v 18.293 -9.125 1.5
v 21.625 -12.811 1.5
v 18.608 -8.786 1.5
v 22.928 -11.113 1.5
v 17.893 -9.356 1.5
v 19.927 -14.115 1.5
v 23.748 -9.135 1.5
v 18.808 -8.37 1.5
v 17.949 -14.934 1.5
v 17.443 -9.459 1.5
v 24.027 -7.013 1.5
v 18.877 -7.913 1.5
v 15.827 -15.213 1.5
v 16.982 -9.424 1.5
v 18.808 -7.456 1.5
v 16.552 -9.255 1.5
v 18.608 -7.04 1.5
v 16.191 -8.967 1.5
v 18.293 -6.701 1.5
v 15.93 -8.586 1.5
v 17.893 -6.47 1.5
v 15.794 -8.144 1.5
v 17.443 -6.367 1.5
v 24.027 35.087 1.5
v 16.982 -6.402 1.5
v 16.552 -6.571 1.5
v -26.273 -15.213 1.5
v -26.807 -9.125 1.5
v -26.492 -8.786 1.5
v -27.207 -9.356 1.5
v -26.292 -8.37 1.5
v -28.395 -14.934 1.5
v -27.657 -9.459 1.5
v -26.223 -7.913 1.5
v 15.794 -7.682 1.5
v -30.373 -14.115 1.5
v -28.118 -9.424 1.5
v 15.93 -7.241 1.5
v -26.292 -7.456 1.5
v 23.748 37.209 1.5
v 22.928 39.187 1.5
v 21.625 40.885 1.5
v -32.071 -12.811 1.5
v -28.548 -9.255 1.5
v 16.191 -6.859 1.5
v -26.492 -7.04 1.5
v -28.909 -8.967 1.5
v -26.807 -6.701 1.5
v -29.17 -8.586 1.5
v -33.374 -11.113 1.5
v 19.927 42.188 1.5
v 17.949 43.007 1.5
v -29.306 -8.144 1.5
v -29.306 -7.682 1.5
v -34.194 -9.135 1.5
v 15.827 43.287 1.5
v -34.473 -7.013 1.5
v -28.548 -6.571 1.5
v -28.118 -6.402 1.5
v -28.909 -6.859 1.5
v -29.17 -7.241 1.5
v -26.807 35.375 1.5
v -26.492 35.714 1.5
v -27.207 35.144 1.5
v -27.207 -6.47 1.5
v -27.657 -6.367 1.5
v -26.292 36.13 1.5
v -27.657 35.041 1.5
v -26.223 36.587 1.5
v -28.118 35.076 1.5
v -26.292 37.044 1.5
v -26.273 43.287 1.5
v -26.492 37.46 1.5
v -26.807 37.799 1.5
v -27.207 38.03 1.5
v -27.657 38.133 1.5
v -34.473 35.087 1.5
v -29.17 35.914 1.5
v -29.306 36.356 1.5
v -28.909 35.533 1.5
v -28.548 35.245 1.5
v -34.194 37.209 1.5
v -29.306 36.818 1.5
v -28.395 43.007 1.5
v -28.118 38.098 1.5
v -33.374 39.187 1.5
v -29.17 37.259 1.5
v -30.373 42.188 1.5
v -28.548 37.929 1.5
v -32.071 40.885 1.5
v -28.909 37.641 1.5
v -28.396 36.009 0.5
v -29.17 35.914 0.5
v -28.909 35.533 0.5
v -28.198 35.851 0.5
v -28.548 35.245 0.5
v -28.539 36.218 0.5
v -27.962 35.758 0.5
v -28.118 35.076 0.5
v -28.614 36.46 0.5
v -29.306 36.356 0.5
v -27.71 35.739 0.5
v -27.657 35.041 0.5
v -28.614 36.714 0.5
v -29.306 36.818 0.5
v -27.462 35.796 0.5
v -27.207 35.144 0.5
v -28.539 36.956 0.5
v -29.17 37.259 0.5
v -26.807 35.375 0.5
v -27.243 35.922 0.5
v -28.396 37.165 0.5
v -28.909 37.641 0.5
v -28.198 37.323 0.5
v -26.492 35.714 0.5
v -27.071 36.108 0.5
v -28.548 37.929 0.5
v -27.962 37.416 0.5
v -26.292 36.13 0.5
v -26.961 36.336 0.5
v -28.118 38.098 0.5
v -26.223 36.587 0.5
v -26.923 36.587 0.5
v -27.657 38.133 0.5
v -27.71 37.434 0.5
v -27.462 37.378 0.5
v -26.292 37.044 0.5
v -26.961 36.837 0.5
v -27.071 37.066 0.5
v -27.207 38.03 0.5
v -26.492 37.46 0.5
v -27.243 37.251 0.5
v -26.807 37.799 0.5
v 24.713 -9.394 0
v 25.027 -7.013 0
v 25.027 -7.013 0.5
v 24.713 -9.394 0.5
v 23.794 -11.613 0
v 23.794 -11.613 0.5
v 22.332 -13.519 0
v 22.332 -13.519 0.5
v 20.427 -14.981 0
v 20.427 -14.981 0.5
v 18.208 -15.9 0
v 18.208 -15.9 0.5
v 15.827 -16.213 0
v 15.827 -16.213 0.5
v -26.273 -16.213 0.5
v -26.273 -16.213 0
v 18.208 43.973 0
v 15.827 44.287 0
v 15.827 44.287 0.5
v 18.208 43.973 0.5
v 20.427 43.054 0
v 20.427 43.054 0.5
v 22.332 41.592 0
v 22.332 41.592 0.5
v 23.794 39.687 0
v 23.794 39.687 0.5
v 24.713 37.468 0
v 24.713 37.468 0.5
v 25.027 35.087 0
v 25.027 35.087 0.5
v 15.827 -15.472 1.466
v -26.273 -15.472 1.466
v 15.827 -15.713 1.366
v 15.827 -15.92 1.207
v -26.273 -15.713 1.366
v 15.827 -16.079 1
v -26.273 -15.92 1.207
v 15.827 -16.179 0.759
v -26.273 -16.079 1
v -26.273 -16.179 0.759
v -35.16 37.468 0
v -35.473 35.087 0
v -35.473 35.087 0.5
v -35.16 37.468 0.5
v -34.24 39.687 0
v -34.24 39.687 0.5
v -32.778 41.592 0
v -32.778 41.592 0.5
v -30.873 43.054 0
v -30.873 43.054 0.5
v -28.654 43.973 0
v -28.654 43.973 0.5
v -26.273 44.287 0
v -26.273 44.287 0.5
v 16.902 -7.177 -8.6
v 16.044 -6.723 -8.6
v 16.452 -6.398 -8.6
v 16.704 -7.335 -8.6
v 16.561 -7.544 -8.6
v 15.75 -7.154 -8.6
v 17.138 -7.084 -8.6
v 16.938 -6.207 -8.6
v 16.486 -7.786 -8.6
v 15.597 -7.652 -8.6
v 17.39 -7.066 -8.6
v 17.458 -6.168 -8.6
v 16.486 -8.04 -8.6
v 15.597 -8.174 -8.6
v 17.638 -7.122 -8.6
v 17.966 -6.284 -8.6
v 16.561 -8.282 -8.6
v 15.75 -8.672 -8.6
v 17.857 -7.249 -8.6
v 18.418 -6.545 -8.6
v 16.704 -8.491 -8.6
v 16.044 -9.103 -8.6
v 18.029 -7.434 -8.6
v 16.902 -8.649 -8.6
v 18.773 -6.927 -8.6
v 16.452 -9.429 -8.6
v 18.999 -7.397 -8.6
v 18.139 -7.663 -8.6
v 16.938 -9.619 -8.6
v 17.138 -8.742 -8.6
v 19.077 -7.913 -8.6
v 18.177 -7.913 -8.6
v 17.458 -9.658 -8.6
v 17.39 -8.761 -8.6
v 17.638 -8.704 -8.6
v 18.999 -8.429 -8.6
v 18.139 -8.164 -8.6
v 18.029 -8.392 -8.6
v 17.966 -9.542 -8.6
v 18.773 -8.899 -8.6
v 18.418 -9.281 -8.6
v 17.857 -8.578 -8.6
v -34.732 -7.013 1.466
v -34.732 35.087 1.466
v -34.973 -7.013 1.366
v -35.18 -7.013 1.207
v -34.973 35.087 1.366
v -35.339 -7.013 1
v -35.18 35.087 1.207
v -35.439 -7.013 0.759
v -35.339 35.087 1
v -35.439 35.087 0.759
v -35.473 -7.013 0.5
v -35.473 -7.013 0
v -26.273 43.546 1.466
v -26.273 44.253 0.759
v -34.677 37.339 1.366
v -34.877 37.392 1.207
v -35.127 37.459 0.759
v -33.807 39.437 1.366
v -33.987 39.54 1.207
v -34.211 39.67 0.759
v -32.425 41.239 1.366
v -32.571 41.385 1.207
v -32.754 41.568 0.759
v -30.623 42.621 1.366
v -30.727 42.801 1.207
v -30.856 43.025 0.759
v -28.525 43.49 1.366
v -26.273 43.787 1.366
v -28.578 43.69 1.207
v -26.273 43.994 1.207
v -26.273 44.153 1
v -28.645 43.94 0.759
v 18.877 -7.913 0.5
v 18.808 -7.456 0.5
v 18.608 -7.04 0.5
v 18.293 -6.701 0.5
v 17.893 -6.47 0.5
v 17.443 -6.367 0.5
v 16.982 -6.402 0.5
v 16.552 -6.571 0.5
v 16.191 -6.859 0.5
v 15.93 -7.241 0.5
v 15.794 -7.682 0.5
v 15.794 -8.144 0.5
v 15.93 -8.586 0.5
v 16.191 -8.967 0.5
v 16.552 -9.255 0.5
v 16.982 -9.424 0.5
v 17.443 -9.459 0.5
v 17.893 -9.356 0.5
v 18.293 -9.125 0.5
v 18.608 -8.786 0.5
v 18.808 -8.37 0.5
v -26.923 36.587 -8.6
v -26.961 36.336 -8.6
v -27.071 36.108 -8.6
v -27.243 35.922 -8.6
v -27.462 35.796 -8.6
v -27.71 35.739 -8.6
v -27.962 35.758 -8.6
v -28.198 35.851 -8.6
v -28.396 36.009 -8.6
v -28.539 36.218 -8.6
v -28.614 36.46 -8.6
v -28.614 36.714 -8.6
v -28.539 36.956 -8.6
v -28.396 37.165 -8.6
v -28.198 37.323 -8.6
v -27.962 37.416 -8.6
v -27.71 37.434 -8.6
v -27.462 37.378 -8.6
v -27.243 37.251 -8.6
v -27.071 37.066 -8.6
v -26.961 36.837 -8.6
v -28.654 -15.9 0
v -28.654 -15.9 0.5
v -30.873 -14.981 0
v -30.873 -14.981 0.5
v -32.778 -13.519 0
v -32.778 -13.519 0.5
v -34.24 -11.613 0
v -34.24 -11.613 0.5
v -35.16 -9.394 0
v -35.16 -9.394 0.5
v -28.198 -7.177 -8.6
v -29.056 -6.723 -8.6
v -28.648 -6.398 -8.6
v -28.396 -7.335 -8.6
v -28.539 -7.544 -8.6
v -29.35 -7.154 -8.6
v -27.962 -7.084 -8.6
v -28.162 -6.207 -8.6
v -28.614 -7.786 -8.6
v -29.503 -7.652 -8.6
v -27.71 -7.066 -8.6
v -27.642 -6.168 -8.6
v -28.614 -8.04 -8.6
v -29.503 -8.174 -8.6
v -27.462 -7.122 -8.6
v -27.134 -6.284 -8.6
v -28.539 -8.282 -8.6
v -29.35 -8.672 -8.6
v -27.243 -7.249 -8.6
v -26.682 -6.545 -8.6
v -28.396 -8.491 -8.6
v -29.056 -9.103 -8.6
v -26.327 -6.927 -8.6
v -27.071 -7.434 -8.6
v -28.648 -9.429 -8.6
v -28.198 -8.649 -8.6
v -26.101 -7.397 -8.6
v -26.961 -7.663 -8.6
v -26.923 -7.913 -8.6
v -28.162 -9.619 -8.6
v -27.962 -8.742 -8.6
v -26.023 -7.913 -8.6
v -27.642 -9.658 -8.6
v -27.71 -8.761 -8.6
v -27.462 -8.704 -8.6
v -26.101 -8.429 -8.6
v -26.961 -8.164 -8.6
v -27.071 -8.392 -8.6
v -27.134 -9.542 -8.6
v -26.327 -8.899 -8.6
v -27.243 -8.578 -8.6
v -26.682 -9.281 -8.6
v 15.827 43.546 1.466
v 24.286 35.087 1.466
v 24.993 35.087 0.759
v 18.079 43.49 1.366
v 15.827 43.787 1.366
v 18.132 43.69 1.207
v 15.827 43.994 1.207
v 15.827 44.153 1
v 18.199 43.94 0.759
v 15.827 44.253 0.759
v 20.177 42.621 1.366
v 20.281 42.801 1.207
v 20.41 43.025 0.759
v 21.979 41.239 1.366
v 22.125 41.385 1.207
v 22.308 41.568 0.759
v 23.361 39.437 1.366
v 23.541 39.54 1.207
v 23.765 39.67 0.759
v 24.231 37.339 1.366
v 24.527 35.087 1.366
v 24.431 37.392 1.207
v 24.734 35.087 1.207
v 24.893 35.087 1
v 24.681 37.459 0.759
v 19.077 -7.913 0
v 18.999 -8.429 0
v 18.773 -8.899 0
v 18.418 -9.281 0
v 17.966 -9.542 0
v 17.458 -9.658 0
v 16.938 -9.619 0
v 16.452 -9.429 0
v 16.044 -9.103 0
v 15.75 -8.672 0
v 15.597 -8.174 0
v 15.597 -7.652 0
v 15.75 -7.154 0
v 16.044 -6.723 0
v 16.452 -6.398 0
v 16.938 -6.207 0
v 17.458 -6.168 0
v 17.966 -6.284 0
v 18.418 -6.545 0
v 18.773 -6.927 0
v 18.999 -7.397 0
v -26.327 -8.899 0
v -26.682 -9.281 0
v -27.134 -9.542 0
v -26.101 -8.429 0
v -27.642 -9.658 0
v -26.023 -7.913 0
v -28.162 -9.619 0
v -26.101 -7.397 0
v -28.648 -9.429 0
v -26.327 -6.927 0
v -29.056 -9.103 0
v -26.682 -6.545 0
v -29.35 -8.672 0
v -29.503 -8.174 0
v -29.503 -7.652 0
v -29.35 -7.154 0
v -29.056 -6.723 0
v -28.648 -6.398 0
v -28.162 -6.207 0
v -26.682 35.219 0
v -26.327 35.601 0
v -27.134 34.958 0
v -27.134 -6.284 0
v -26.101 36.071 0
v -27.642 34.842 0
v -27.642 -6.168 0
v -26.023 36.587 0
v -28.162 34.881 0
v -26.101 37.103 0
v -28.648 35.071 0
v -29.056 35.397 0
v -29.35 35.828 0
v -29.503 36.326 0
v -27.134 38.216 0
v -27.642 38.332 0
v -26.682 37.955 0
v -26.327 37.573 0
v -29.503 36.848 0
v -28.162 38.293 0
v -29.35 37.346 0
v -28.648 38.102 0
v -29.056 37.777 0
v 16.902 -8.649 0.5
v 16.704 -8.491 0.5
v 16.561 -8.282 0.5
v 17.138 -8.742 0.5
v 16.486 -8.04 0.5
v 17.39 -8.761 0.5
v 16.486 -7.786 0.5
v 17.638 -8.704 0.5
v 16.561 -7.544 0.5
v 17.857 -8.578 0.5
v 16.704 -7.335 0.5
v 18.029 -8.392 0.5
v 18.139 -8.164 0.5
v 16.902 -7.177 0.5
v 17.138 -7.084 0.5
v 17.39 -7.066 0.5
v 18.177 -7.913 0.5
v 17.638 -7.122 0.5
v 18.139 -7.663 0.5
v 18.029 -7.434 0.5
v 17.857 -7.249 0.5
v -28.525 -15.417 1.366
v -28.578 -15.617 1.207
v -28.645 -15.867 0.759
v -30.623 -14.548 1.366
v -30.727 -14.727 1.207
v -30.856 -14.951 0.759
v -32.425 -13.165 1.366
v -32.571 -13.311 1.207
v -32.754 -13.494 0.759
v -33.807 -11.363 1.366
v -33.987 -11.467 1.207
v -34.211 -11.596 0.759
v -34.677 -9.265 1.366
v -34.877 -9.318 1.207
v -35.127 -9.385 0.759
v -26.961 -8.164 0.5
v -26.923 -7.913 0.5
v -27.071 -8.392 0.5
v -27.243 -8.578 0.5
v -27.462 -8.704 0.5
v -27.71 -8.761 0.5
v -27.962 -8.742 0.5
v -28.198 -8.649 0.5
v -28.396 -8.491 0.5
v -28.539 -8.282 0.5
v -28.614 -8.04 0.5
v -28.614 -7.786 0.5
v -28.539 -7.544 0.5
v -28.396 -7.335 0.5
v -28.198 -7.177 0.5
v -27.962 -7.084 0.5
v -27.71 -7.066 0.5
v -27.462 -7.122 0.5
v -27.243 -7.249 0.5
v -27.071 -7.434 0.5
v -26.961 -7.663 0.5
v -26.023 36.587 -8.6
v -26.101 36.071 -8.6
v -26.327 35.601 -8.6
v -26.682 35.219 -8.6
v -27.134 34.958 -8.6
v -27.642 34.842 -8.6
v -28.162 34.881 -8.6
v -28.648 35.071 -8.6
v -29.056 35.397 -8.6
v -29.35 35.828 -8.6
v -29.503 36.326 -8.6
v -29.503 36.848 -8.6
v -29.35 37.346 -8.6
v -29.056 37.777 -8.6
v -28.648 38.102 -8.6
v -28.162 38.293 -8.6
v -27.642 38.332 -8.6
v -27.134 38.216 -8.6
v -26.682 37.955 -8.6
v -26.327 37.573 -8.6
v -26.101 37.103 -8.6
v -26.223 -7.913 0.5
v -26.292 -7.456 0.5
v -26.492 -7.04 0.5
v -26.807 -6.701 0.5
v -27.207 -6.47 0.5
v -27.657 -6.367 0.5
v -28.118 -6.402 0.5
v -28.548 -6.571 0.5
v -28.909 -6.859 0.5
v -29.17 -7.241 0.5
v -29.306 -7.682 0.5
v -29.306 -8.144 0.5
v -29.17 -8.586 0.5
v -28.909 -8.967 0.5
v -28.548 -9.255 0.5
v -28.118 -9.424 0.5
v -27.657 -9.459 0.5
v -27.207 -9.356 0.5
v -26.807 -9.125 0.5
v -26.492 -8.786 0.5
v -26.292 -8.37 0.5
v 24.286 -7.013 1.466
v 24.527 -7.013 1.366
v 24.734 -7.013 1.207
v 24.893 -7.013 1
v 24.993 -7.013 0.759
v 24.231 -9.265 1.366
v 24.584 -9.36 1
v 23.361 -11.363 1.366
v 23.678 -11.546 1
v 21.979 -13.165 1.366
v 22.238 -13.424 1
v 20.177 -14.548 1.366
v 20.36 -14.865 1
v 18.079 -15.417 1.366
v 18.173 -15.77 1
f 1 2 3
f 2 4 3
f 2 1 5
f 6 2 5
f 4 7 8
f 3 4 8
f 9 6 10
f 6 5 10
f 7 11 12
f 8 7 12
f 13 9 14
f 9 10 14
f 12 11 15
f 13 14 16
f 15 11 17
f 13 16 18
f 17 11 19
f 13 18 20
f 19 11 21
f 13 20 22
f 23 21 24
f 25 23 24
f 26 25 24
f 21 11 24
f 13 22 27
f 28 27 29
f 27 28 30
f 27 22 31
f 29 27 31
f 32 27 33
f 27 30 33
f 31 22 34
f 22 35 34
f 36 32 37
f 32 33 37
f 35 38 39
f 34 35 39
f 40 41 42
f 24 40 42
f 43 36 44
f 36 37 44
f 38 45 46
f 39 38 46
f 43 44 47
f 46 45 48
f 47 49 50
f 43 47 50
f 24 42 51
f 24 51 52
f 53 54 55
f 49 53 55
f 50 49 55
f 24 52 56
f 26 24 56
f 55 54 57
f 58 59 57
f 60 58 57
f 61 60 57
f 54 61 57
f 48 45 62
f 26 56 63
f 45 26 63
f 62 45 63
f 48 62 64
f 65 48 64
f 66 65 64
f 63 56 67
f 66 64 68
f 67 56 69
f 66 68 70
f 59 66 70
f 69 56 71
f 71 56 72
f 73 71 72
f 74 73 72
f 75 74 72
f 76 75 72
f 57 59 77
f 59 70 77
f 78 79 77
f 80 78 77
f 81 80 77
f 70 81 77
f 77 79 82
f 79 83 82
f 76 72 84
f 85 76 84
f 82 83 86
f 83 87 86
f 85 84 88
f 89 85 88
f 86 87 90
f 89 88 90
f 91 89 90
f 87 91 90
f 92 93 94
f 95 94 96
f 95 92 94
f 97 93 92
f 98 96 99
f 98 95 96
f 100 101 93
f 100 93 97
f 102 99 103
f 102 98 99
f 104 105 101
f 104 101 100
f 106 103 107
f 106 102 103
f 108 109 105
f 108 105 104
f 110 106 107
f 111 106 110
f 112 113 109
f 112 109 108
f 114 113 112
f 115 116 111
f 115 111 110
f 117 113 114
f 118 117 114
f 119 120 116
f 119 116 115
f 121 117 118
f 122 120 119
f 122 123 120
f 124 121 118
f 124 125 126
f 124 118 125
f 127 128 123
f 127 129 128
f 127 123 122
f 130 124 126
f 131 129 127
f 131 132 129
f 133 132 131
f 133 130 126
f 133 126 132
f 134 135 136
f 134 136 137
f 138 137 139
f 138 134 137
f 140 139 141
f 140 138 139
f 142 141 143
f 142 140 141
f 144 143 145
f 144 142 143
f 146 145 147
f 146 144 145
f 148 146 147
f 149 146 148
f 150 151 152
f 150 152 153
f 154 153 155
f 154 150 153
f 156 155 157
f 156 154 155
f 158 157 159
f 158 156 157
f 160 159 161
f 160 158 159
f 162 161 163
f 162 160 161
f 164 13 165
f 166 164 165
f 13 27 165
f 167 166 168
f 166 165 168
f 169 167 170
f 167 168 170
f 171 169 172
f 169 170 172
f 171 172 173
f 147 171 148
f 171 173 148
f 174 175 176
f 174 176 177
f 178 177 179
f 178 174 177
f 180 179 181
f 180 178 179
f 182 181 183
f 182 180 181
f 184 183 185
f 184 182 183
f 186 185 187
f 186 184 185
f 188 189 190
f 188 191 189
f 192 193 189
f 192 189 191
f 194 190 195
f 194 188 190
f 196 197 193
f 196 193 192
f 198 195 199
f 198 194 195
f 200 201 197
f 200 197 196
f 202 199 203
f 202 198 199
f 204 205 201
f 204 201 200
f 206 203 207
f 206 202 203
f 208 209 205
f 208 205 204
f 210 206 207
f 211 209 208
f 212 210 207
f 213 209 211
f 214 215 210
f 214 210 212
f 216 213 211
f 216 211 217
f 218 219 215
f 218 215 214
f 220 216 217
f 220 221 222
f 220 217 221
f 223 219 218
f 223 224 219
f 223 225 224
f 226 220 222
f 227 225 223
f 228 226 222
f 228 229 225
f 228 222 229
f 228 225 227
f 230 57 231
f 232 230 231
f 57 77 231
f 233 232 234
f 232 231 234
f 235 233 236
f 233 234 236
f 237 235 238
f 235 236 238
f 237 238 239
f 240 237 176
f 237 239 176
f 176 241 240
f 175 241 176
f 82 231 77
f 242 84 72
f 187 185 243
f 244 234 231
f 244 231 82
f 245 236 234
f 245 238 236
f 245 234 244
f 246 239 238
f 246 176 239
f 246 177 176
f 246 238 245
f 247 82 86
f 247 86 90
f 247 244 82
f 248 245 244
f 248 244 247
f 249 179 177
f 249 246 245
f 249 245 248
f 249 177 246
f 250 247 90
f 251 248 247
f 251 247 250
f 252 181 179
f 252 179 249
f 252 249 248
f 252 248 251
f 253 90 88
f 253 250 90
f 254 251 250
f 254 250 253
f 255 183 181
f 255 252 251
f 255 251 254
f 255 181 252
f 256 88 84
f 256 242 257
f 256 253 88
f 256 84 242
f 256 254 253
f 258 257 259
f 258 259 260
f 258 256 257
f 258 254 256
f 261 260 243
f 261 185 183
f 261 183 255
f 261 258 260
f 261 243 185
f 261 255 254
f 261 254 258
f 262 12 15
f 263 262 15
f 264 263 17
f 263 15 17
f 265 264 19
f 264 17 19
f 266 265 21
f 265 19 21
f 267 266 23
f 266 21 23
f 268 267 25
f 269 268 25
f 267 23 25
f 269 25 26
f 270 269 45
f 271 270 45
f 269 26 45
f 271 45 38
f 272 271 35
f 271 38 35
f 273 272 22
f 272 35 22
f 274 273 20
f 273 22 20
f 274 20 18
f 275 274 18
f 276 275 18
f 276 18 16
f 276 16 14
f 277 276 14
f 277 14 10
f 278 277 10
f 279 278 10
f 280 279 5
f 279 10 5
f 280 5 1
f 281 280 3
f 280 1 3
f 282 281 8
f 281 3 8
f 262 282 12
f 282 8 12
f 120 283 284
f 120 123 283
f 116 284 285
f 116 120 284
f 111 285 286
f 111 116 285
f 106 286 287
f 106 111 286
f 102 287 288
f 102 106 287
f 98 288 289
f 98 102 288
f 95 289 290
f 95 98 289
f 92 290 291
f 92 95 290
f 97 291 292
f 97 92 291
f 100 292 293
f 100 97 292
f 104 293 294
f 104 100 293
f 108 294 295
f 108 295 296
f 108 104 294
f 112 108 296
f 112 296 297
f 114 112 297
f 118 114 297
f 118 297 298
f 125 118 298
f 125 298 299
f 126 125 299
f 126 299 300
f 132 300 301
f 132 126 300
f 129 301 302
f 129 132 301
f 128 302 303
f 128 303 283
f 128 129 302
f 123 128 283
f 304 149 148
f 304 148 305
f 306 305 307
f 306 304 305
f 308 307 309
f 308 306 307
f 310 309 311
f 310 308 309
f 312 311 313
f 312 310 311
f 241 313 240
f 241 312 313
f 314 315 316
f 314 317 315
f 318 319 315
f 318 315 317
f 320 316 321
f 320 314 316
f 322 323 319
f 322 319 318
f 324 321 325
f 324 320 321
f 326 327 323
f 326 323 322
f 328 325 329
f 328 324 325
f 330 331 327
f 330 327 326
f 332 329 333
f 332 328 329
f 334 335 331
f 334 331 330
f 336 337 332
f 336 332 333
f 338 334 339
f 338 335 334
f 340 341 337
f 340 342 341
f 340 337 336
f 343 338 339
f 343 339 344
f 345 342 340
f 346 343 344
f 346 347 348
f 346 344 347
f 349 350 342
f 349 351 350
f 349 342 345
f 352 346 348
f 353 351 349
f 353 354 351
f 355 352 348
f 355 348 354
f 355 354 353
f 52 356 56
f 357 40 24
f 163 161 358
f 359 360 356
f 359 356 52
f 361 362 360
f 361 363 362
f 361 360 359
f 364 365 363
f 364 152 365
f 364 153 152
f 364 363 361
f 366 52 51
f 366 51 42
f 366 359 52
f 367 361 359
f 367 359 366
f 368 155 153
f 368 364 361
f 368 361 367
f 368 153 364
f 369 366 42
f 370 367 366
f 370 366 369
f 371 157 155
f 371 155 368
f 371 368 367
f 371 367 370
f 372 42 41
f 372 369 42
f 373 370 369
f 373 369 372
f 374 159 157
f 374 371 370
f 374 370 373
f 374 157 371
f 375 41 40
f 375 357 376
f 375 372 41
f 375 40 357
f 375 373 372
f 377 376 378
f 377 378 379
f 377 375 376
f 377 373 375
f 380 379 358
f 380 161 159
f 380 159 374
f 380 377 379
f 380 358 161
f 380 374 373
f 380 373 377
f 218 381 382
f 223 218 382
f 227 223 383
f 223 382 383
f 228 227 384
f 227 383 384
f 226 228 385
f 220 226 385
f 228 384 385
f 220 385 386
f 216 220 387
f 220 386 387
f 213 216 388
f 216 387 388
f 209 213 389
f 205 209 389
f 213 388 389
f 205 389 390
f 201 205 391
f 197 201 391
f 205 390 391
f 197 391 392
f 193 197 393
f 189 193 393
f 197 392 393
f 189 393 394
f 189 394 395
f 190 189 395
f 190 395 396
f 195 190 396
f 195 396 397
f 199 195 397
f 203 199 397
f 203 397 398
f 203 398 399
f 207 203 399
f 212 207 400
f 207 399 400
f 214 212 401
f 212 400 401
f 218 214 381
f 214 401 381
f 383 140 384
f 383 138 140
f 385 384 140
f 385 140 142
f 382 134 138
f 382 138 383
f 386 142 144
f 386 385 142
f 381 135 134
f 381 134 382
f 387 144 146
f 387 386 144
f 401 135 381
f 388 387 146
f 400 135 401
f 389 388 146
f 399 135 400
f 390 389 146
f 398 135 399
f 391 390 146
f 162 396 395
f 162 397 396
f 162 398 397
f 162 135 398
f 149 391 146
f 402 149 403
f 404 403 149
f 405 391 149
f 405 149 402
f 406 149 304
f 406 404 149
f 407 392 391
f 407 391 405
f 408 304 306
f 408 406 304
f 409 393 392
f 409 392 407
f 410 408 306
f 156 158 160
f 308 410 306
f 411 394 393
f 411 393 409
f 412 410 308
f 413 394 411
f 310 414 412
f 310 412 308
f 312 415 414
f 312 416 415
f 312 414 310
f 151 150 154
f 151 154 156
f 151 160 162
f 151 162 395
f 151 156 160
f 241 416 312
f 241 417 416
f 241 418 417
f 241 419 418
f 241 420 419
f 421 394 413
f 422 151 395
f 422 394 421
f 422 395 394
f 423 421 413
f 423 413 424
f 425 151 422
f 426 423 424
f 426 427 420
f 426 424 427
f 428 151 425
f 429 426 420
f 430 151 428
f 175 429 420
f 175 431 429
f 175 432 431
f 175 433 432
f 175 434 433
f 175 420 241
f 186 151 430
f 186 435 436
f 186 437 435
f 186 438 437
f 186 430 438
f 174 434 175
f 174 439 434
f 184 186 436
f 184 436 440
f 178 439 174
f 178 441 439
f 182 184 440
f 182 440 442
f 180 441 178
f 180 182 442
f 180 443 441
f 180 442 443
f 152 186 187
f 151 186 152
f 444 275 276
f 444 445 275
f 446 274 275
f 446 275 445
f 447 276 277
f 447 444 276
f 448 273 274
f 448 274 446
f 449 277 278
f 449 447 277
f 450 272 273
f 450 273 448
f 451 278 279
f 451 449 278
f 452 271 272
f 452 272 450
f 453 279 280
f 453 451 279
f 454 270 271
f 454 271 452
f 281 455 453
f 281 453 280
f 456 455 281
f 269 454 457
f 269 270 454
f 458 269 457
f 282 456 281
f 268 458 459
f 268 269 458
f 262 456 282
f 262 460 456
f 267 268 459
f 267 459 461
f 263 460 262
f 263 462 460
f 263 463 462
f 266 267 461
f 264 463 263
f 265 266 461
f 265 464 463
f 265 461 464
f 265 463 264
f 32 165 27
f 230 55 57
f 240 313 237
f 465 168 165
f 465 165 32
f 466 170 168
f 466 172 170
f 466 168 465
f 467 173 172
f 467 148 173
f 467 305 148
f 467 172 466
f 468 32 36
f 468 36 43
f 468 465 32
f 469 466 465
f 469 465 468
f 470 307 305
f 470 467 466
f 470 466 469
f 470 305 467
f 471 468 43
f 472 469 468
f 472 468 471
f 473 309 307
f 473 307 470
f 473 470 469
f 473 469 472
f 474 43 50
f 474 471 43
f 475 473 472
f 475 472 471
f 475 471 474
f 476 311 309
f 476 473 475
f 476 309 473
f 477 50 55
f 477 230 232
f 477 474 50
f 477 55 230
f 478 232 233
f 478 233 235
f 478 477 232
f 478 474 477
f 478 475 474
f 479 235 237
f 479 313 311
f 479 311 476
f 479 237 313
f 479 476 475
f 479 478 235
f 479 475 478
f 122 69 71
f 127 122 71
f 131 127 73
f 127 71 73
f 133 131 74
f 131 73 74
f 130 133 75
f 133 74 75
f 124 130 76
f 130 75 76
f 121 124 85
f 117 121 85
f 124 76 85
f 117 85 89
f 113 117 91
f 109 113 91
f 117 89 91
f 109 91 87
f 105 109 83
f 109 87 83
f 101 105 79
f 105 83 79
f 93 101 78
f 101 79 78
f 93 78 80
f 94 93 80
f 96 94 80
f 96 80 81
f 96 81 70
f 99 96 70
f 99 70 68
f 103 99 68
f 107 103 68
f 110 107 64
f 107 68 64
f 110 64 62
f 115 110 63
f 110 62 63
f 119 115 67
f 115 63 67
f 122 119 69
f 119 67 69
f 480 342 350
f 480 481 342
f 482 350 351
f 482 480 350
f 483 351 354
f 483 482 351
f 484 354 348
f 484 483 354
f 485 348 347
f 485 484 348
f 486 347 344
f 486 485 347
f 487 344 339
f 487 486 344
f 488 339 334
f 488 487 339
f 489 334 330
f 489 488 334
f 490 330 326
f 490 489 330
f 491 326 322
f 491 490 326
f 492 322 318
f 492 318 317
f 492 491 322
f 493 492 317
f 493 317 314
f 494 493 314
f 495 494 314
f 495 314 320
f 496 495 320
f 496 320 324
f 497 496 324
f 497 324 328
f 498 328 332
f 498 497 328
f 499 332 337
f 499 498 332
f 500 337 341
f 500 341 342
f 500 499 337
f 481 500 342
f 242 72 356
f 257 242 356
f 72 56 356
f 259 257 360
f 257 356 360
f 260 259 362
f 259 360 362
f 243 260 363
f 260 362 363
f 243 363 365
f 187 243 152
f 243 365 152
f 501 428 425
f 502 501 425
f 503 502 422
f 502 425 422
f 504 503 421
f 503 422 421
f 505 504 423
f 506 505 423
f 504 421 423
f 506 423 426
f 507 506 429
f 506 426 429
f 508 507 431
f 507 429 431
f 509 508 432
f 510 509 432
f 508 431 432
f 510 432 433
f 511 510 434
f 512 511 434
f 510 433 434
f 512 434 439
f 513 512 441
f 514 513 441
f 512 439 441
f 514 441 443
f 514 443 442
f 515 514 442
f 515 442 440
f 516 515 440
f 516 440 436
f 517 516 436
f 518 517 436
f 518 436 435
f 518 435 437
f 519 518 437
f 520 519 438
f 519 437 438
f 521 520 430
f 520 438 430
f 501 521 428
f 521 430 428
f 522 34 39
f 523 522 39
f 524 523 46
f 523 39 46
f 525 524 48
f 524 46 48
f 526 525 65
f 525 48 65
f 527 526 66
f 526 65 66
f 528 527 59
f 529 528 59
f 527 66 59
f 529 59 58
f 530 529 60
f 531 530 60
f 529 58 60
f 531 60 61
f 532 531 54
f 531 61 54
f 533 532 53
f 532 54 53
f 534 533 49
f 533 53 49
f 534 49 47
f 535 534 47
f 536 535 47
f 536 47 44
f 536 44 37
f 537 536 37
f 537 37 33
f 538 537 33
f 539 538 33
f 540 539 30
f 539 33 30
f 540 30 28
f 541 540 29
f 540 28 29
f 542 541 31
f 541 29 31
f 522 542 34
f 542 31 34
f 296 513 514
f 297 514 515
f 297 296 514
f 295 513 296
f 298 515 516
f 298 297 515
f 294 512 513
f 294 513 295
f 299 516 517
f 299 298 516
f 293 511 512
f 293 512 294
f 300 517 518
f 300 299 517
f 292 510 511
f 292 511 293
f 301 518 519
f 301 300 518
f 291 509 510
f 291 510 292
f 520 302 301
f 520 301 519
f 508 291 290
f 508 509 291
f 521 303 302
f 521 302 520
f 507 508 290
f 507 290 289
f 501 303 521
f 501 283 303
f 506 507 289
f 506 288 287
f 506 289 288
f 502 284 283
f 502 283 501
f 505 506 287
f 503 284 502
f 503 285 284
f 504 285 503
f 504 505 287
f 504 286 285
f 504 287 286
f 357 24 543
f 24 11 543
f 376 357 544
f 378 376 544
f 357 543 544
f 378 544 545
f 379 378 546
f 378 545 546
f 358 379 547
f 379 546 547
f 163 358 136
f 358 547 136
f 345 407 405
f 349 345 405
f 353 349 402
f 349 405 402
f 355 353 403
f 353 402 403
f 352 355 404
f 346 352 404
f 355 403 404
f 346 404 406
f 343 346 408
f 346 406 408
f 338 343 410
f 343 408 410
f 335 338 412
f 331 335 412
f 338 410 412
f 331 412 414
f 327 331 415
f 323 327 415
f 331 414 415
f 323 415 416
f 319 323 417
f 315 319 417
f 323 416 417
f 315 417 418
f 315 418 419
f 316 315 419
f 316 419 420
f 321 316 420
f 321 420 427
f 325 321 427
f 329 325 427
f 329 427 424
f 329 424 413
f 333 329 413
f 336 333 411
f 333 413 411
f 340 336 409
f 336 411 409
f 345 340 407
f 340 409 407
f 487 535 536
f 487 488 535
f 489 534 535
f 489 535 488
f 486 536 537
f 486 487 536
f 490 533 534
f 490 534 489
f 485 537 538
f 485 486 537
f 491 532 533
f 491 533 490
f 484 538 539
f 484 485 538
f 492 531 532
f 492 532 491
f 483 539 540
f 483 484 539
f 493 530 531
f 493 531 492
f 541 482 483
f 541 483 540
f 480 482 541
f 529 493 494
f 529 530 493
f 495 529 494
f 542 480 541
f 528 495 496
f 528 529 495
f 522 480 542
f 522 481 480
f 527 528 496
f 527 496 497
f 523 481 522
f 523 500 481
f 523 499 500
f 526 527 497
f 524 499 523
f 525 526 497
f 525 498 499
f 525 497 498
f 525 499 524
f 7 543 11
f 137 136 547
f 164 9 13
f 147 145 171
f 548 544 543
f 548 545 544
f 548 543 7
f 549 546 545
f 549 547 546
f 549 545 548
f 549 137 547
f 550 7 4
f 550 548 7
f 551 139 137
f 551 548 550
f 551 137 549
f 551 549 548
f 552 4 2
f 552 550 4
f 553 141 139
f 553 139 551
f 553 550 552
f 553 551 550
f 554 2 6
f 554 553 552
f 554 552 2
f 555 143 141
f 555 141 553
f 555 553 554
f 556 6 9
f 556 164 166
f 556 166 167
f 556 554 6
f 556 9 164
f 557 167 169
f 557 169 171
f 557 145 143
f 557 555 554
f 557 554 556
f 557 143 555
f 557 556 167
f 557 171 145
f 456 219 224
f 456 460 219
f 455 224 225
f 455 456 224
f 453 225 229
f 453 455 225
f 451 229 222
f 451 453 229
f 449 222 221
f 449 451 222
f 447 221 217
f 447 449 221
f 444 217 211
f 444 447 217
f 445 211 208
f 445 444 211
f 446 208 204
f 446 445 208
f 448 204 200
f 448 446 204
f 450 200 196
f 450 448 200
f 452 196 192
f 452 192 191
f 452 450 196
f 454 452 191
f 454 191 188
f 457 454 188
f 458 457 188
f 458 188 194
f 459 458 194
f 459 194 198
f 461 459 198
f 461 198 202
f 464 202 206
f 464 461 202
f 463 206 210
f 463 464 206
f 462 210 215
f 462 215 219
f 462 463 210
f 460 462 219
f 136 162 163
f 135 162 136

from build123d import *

# Parameters (mm, degrees)
EXTRUDE_1_DEPTH     = 1.5
SKETCH_2_R          = 0.85
CUT_EXTRUDE_1_DEPTH = 11
SKETCH_4_R          = 0.85
CUT_EXTRUDE_2_DEPTH = 11.5
SKETCH_5_R          = 0.85
CUT_EXTRUDE_3_DEPTH = 11.5
SKETCH_9_R          = 1.55
SKETCH_9_R_2        = 0.85
CUT_EXTRUDE_5_DEPTH = 1
SKETCH_8_R          = 1.75
SKETCH_8_R_2        = 0.85
EXTRUDE_6_DEPTH     = 8.6
FILLET_2_R          = 1


with BuildPart() as part:
    # 草图1 → 凸台-拉伸1 (new body)
    with BuildSketch(Plane.XY):
        with BuildLine():
            Line((-26.273021583, 44.286870504), (15.826978417, 44.286870504))
            ThreePointArc((15.826978417, 44.286870504), (22.332360804, 41.592252891), (25.026978417, 35.086870504))
            Line((25.026978417, 35.086870504), (25.026978417, -7.013129496))
            ThreePointArc((25.026978417, -7.013129496), (22.332360804, -13.518511883), (15.826978417, -16.213129496))
            Line((15.826978417, -16.213129496), (-26.273021583, -16.213129496))
            ThreePointArc((-26.273021583, -16.213129496), (-32.77840397, -13.518511883), (-35.473021583, -7.013129496))
            Line((-35.473021583, -7.013129496), (-35.473021583, 35.086870504))
            ThreePointArc((-35.473021583, 35.086870504), (-32.77840397, 41.592252891), (-26.273021583, 44.286870504))
        make_face()
    extrude(amount=EXTRUDE_1_DEPTH)

    # 草图2 → 切除-拉伸1 (cut)
    with BuildSketch(Plane.XY.offset(1.5)):
        with Locations((-27.773021583, 36.586870504)):
            Circle(SKETCH_2_R)
    extrude(amount=-CUT_EXTRUDE_1_DEPTH, mode=Mode.SUBTRACT)

    # 草图4 → 切除-拉伸2 (cut)
    with BuildSketch(Plane.XY.offset(1.5)):
        with Locations((-27.773021583, -7.913129496)):
            Circle(SKETCH_4_R)
    extrude(amount=-CUT_EXTRUDE_2_DEPTH, mode=Mode.SUBTRACT)

    # 草图5 → 切除-拉伸3 (cut)
    with BuildSketch(Plane.XY.offset(1.5)):
        with Locations((17.326978417, -7.913129496)):
            Circle(SKETCH_5_R)
    extrude(amount=-CUT_EXTRUDE_3_DEPTH, mode=Mode.SUBTRACT)

    # 草图9 → 切除-拉伸5 (cut)
    # profile 1 of 3: a face of its own
    with BuildSketch(Plane.XY.offset(1.5)):
        with Locations((-27.773021583, 36.586870504)):
            Circle(SKETCH_9_R)
        with Locations((-27.773021583, 36.586870504)):
            Circle(SKETCH_9_R_2, mode=Mode.SUBTRACT)
    # profile 2 of 3: a face of its own
    with BuildSketch(Plane.XY.offset(1.5)):
        with Locations((-27.773021583, -7.913129496)):
            Circle(SKETCH_9_R)
        with Locations((-27.773021583, -7.913129496)):
            Circle(SKETCH_9_R_2, mode=Mode.SUBTRACT)
    # profile 3 of 3: a face of its own
    with BuildSketch(Plane.XY.offset(1.5)):
        with Locations((17.326978417, -7.913129496)):
            Circle(SKETCH_9_R)
        with Locations((17.326978417, -7.913129496)):
            Circle(SKETCH_9_R_2, mode=Mode.SUBTRACT)
    extrude(amount=-CUT_EXTRUDE_5_DEPTH, mode=Mode.SUBTRACT)

    # 草图8 → 凸台-拉伸6 (add)
    # profile 1 of 3: a face of its own
    with BuildSketch(Plane(origin=(0, 0, 0), x_dir=(-1, 0, 0), z_dir=(0, 0, -1))):
        with Locations(Location((27.773021583, 36.586870504, 0), (0, 0, 180))):
            Circle(SKETCH_8_R)
        with Locations(Location((27.773021583, 36.586870504, 0), (0, 0, 180))):
            Circle(SKETCH_8_R_2, mode=Mode.SUBTRACT)
    # profile 2 of 3: a face of its own
    with BuildSketch(Plane(origin=(0, 0, 0), x_dir=(-1, 0, 0), z_dir=(0, 0, -1))):
        with Locations(Location((27.773021583, -7.913129496, 0), (0, 0, 180))):
            Circle(SKETCH_8_R)
        with Locations(Location((27.773021583, -7.913129496, 0), (0, 0, 180))):
            Circle(SKETCH_8_R_2, mode=Mode.SUBTRACT)
    # profile 3 of 3: a face of its own
    with BuildSketch(Plane(origin=(0, 0, 0), x_dir=(-1, 0, 0), z_dir=(0, 0, -1))):
        with Locations(Location((-17.326978417, -7.913129496, 0), (0, 0, 180))):
            Circle(SKETCH_8_R)
        with Locations(Location((-17.326978417, -7.913129496, 0), (0, 0, 180))):
            Circle(SKETCH_8_R_2, mode=Mode.SUBTRACT)
    extrude(amount=EXTRUDE_6_DEPTH)

    # 圆角2
    fillet_2_edges = [part.edges().sort_by_distance(p)[0] for p in [
        (22.332360804, -13.518511883, 1.5),
        (25.026978417, 14.036870504, 1.5),
        (22.332360804, 41.592252891, 1.5),
        (-5.223021583, 44.286870504, 1.5),
        (-32.77840397, 41.592252891, 1.5),
        (-35.473021583, 14.036870504, 1.5),
        (-32.77840397, -13.518511883, 1.5),
        (-5.223021583, -16.213129496, 1.5),
    ]]
    fillet(fillet_2_edges, radius=FILLET_2_R)


solid = part.part
